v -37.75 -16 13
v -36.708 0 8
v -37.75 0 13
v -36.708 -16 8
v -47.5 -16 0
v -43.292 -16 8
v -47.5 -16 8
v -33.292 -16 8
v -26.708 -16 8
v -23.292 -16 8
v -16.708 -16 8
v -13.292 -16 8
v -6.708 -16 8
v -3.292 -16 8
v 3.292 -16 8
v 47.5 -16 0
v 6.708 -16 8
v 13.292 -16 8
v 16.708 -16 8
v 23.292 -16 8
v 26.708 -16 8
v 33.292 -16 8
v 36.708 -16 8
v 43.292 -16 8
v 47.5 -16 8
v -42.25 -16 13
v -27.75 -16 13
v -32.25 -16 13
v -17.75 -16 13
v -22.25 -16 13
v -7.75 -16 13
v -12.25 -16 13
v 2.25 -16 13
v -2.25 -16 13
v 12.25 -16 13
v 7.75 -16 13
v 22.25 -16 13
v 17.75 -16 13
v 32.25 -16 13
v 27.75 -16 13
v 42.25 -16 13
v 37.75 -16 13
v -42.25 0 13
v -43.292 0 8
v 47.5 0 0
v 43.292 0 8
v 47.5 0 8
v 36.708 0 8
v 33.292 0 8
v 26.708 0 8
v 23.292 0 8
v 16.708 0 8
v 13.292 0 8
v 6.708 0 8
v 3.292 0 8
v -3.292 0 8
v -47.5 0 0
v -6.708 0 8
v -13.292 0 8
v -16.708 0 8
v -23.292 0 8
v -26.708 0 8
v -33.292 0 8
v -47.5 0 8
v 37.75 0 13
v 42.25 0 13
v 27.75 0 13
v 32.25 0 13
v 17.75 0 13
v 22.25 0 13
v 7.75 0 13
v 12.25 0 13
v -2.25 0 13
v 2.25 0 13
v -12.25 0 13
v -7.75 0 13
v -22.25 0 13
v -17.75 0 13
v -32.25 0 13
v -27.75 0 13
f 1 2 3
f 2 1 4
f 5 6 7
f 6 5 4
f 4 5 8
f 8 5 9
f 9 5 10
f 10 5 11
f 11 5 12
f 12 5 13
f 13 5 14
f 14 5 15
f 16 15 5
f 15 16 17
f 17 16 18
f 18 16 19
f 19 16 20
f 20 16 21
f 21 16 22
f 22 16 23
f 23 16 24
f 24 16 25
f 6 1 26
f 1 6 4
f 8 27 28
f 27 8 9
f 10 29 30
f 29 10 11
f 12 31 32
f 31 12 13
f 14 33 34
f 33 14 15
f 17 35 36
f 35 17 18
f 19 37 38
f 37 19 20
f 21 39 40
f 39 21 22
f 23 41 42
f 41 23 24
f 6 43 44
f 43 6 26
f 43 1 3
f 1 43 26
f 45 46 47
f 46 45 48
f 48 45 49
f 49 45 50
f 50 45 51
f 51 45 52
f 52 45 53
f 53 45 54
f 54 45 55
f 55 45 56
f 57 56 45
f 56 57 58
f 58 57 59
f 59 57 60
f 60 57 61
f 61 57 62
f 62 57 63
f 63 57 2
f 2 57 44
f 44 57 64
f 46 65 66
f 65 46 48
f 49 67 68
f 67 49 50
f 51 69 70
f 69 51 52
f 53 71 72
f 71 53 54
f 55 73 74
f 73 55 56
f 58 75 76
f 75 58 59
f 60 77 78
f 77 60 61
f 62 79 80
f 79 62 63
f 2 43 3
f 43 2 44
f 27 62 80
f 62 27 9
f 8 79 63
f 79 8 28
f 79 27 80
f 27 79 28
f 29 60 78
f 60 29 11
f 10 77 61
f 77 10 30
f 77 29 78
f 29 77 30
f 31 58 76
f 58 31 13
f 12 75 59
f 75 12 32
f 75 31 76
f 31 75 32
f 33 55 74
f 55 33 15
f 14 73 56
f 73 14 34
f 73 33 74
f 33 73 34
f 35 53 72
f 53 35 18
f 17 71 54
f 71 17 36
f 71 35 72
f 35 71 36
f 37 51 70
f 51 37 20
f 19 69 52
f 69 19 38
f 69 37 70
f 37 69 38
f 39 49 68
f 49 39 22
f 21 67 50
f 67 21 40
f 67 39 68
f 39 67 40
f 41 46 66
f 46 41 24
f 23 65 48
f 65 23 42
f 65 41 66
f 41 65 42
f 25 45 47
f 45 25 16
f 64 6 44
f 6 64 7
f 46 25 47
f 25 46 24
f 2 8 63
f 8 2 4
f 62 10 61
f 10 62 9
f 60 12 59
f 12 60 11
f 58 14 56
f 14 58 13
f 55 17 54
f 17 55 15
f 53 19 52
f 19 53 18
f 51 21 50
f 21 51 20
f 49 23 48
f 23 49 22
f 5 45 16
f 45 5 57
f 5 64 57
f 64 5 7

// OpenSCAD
$fn = 32;

// ----------------------------------------------------------------------
// Toothed rack, 9 teeth
// 10 mm pitch, 5 mm teeth
// ----------------------------------------------------------------------

// --- parameters (mm) ---
bar_w = 16;     // bar width (Y)
bar_h = 8;      // bar height (Z)
teeth = 9;      // number of teeth
pitch = 10;     // tooth pitch
tooth_h = 5;    // tooth height above the bar
root_w = 7;     // tooth width at the root
crest_w = 4.5;  // tooth width at the crest

// --- derived feature positions (mm) ---
span = (teeth - 1) * pitch;  // = 80   distance between the outer teeth
bar_l = span + root_w + 8;   // = 95   bar length: teeth plus 4 mm at each end
tooth_x = -span / 2;         // = -40   X of the first tooth
height = bar_h + tooth_h;    // = 13   overall height
feature_centers = [
  [tooth_x + 0 * pitch, -bar_w / 2],
  [tooth_x + 1 * pitch, -bar_w / 2],
  [tooth_x + 2 * pitch, -bar_w / 2],
  [tooth_x + 3 * pitch, -bar_w / 2],
  [tooth_x + 4 * pitch, -bar_w / 2],
  [tooth_x + 5 * pitch, -bar_w / 2],
  [tooth_x + 6 * pitch, -bar_w / 2],
  [tooth_x + 7 * pitch, -bar_w / 2],
  [tooth_x + 8 * pitch, -bar_w / 2]
];   // tooth centre line, drives the tooth loop

// bar with a rack of teeth, one extruded trapezoium per centre
module rack_tooth() {
  linear_extrude(height = bar_w)
    polygon(points = [
      [0, 0],
      [root_w, 0],
      [root_w / 2 + crest_w / 2, tooth_h + 1],
      [root_w / 2 - crest_w / 2, tooth_h + 1]
    ]);
}

union() {
  translate([-bar_l / 2, -bar_w, 0]) cube([bar_l, bar_w, bar_h]);
  for (centre = feature_centers)
    translate([centre[0] - root_w / 2, 0, bar_h - 1]) rotate([90, 0, 0]) rack_tooth();
}
